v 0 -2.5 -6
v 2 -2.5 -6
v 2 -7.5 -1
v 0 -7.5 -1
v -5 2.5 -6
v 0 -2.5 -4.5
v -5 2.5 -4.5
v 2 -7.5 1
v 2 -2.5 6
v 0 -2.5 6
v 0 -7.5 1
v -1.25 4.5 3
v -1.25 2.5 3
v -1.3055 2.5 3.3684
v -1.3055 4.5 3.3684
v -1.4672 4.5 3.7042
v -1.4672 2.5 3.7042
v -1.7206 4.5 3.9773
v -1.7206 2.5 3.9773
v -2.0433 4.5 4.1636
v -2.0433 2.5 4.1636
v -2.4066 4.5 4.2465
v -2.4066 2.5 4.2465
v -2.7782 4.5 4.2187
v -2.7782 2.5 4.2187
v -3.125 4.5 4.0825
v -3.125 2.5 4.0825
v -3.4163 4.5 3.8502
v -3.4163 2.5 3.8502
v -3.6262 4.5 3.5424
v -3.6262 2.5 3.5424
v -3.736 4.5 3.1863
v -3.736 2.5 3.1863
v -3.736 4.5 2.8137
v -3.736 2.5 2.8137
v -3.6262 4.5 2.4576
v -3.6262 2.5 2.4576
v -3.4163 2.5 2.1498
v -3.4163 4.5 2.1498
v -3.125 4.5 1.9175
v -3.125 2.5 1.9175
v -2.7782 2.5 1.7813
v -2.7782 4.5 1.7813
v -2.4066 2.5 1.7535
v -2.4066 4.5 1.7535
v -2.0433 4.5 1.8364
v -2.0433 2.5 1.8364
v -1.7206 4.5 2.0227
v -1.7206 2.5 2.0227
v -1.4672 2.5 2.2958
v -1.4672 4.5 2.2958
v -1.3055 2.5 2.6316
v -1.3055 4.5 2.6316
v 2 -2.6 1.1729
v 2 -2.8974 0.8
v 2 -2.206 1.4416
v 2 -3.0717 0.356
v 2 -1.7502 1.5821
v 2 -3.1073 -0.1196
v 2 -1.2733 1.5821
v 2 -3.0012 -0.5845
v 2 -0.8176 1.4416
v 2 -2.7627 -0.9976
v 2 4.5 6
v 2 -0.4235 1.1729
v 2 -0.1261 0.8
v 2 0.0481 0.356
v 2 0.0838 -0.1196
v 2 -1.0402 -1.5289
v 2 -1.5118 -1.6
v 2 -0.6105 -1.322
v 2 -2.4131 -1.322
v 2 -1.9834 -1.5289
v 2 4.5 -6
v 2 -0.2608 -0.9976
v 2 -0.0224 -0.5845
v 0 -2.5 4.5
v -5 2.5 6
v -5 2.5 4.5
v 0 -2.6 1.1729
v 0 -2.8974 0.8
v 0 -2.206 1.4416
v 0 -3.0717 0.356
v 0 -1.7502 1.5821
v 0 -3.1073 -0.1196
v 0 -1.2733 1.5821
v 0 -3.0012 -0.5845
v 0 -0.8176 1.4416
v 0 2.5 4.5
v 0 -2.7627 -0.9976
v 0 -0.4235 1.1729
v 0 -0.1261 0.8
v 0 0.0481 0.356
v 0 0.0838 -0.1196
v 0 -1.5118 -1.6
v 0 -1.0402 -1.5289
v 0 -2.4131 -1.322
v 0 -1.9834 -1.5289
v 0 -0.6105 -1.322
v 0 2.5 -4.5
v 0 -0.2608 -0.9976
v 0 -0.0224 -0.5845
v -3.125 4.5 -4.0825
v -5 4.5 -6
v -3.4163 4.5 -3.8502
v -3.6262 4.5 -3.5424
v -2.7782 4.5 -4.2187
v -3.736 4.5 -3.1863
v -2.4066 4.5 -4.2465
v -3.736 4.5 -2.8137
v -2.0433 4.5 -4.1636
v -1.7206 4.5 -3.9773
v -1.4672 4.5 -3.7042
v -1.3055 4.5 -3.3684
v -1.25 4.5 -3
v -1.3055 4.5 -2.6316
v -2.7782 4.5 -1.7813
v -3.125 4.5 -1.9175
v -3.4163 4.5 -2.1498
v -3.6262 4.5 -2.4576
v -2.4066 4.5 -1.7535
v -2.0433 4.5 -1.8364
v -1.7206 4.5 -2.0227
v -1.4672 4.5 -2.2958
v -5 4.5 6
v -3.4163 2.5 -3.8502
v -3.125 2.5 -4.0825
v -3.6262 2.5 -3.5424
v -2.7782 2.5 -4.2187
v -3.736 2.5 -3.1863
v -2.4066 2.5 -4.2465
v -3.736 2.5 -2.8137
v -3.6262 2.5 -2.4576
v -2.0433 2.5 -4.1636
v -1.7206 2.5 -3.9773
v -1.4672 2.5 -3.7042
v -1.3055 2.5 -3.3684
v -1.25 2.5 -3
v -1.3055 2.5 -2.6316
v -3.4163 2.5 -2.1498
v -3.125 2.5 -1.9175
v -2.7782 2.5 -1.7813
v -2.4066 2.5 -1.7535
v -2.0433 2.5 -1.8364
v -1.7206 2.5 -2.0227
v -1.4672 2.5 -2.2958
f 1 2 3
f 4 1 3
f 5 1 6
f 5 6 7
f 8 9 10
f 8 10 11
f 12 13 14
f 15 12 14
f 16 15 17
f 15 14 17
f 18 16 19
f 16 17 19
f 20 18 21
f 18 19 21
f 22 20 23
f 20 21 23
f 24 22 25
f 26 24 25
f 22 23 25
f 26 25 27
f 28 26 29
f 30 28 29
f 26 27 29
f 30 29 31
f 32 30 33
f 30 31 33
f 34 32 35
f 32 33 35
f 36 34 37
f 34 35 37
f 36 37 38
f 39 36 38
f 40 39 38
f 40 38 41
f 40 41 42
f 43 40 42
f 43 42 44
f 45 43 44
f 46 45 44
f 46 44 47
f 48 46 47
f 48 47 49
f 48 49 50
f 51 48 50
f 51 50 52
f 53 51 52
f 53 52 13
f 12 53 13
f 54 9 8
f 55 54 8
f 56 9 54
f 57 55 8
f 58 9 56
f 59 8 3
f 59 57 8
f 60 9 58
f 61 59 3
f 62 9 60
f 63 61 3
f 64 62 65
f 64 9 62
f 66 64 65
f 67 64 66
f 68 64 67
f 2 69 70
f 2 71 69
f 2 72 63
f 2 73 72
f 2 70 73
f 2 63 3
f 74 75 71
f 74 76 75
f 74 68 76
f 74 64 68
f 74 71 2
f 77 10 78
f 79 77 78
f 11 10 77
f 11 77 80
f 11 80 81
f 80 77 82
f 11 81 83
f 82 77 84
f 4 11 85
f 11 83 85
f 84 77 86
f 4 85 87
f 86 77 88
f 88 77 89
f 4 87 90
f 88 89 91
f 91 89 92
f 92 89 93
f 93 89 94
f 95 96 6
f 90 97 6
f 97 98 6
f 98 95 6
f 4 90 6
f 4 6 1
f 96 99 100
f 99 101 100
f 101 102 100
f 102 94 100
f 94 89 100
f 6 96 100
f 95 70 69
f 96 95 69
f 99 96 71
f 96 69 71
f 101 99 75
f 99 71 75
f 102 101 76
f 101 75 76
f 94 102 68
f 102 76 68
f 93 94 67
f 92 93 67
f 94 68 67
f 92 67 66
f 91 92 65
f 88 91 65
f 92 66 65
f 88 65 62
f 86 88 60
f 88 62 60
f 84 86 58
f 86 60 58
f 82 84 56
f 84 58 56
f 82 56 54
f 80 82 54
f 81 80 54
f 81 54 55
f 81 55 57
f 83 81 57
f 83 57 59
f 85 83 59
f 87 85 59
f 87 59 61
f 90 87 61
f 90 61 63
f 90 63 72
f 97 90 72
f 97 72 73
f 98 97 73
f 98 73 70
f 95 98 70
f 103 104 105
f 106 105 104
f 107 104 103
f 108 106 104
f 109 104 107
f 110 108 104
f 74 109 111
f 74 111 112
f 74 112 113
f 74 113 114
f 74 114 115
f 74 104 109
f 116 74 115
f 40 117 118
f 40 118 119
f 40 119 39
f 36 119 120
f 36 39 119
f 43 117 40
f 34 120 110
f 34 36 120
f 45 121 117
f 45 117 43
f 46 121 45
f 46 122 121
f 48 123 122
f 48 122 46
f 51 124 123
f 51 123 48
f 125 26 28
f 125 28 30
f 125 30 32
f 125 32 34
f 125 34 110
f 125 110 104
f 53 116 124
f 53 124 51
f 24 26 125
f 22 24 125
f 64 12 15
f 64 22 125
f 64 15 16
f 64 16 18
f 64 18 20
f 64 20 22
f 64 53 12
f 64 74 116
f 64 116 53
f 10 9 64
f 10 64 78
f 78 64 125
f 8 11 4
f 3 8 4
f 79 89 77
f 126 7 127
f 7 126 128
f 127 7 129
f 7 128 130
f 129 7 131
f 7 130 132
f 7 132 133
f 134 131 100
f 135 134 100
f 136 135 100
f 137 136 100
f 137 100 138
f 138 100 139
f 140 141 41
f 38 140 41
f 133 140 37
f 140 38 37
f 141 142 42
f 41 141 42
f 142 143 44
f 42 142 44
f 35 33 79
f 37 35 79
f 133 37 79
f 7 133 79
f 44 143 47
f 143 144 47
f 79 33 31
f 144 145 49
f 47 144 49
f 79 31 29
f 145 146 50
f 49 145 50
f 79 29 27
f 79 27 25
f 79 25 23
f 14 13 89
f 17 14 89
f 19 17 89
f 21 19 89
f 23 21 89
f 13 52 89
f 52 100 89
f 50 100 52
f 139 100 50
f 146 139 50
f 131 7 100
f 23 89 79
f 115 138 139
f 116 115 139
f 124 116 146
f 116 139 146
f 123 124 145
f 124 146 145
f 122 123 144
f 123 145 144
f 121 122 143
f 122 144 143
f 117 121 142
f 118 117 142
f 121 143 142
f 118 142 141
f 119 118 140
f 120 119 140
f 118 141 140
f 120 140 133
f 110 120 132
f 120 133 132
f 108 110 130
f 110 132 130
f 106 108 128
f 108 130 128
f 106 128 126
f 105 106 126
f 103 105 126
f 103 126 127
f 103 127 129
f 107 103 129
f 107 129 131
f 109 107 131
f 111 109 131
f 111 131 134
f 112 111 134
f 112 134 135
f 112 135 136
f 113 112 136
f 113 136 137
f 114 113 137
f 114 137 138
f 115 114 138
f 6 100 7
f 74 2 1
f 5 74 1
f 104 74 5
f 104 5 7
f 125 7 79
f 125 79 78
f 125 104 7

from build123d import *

# Parameters (mm, degrees)
SKETCH1_W           = 12
SKETCH1_H           = 12
BOSS_EXTRUDE1_DEPTH = 2
SKETCH3_W           = 12
SKETCH3_H           = 2
BOSS_EXTRUDE2_DEPTH = 5
CUT_EXTRUDE1_DEPTH  = 5
SKETCH5_R           = 1.6
CUT_EXTRUDE2_DEPTH  = 5
SKETCH7_R           = 1.25
CUT_EXTRUDE3_DEPTH  = 5
BOSS_EXTRUDE4_DEPTH = 1.5


with BuildPart() as part:
    # Sketch1 → Boss-Extrude1 (new body)
    with BuildSketch(Plane(origin=(0, 0, 0), x_dir=(0, 0, -1), z_dir=(1, 0, 0))):
        with Locations((0, -1.5)):
            Rectangle(SKETCH1_W, SKETCH1_H)
    extrude(amount=BOSS_EXTRUDE1_DEPTH)

    # Sketch3 → Boss-Extrude2 (add)
    with BuildSketch(Plane.ZY):
        with Locations((0, 3.5)):
            Rectangle(SKETCH3_W, SKETCH3_H)
    extrude(amount=BOSS_EXTRUDE2_DEPTH)

    # Sketch4 → Cut-Extrude1 (cut)
    with BuildSketch(Plane(origin=(2, 0, 0), x_dir=(0, 0, -1), z_dir=(1, 0, 0))):
        Polygon((-6, -2.5), (-1, -7.5), (-6, -7.5), align=None)
        Polygon((1, -7.5), (6, -7.5), (6, -2.5), align=None)
    extrude(amount=-CUT_EXTRUDE1_DEPTH, mode=Mode.SUBTRACT)

    # Sketch5 → Cut-Extrude2 (cut)
    with BuildSketch(Plane(origin=(2, 0, 0), x_dir=(0, 0, -1), z_dir=(1, 0, 0))):
        with Locations((0, -1.511770417)):
            Circle(SKETCH5_R)
    extrude(amount=-CUT_EXTRUDE2_DEPTH, mode=Mode.SUBTRACT)

    # Sketch7 → Cut-Extrude3 (cut)
    with BuildSketch(Plane.XZ.offset(-2.5)):
        with Locations((-2.5, 3)):
            Circle(SKETCH7_R)
        with Locations((-2.5, -3)):
            Circle(SKETCH7_R)
    extrude(amount=-CUT_EXTRUDE3_DEPTH, mode=Mode.SUBTRACT)

    # Sketch8 → Boss-Extrude4 (add)
    with BuildSketch(Plane.XY.offset(6)):
        Polygon((-5, 2.5), (0, 2.5), (0, -2.5), align=None)
    boss_extrude4 = extrude(amount=-BOSS_EXTRUDE4_DEPTH)

    # Mirror1: Boss-Extrude4 across plane
    add(boss_extrude4.mirror(Plane.XY))


solid = part.part
